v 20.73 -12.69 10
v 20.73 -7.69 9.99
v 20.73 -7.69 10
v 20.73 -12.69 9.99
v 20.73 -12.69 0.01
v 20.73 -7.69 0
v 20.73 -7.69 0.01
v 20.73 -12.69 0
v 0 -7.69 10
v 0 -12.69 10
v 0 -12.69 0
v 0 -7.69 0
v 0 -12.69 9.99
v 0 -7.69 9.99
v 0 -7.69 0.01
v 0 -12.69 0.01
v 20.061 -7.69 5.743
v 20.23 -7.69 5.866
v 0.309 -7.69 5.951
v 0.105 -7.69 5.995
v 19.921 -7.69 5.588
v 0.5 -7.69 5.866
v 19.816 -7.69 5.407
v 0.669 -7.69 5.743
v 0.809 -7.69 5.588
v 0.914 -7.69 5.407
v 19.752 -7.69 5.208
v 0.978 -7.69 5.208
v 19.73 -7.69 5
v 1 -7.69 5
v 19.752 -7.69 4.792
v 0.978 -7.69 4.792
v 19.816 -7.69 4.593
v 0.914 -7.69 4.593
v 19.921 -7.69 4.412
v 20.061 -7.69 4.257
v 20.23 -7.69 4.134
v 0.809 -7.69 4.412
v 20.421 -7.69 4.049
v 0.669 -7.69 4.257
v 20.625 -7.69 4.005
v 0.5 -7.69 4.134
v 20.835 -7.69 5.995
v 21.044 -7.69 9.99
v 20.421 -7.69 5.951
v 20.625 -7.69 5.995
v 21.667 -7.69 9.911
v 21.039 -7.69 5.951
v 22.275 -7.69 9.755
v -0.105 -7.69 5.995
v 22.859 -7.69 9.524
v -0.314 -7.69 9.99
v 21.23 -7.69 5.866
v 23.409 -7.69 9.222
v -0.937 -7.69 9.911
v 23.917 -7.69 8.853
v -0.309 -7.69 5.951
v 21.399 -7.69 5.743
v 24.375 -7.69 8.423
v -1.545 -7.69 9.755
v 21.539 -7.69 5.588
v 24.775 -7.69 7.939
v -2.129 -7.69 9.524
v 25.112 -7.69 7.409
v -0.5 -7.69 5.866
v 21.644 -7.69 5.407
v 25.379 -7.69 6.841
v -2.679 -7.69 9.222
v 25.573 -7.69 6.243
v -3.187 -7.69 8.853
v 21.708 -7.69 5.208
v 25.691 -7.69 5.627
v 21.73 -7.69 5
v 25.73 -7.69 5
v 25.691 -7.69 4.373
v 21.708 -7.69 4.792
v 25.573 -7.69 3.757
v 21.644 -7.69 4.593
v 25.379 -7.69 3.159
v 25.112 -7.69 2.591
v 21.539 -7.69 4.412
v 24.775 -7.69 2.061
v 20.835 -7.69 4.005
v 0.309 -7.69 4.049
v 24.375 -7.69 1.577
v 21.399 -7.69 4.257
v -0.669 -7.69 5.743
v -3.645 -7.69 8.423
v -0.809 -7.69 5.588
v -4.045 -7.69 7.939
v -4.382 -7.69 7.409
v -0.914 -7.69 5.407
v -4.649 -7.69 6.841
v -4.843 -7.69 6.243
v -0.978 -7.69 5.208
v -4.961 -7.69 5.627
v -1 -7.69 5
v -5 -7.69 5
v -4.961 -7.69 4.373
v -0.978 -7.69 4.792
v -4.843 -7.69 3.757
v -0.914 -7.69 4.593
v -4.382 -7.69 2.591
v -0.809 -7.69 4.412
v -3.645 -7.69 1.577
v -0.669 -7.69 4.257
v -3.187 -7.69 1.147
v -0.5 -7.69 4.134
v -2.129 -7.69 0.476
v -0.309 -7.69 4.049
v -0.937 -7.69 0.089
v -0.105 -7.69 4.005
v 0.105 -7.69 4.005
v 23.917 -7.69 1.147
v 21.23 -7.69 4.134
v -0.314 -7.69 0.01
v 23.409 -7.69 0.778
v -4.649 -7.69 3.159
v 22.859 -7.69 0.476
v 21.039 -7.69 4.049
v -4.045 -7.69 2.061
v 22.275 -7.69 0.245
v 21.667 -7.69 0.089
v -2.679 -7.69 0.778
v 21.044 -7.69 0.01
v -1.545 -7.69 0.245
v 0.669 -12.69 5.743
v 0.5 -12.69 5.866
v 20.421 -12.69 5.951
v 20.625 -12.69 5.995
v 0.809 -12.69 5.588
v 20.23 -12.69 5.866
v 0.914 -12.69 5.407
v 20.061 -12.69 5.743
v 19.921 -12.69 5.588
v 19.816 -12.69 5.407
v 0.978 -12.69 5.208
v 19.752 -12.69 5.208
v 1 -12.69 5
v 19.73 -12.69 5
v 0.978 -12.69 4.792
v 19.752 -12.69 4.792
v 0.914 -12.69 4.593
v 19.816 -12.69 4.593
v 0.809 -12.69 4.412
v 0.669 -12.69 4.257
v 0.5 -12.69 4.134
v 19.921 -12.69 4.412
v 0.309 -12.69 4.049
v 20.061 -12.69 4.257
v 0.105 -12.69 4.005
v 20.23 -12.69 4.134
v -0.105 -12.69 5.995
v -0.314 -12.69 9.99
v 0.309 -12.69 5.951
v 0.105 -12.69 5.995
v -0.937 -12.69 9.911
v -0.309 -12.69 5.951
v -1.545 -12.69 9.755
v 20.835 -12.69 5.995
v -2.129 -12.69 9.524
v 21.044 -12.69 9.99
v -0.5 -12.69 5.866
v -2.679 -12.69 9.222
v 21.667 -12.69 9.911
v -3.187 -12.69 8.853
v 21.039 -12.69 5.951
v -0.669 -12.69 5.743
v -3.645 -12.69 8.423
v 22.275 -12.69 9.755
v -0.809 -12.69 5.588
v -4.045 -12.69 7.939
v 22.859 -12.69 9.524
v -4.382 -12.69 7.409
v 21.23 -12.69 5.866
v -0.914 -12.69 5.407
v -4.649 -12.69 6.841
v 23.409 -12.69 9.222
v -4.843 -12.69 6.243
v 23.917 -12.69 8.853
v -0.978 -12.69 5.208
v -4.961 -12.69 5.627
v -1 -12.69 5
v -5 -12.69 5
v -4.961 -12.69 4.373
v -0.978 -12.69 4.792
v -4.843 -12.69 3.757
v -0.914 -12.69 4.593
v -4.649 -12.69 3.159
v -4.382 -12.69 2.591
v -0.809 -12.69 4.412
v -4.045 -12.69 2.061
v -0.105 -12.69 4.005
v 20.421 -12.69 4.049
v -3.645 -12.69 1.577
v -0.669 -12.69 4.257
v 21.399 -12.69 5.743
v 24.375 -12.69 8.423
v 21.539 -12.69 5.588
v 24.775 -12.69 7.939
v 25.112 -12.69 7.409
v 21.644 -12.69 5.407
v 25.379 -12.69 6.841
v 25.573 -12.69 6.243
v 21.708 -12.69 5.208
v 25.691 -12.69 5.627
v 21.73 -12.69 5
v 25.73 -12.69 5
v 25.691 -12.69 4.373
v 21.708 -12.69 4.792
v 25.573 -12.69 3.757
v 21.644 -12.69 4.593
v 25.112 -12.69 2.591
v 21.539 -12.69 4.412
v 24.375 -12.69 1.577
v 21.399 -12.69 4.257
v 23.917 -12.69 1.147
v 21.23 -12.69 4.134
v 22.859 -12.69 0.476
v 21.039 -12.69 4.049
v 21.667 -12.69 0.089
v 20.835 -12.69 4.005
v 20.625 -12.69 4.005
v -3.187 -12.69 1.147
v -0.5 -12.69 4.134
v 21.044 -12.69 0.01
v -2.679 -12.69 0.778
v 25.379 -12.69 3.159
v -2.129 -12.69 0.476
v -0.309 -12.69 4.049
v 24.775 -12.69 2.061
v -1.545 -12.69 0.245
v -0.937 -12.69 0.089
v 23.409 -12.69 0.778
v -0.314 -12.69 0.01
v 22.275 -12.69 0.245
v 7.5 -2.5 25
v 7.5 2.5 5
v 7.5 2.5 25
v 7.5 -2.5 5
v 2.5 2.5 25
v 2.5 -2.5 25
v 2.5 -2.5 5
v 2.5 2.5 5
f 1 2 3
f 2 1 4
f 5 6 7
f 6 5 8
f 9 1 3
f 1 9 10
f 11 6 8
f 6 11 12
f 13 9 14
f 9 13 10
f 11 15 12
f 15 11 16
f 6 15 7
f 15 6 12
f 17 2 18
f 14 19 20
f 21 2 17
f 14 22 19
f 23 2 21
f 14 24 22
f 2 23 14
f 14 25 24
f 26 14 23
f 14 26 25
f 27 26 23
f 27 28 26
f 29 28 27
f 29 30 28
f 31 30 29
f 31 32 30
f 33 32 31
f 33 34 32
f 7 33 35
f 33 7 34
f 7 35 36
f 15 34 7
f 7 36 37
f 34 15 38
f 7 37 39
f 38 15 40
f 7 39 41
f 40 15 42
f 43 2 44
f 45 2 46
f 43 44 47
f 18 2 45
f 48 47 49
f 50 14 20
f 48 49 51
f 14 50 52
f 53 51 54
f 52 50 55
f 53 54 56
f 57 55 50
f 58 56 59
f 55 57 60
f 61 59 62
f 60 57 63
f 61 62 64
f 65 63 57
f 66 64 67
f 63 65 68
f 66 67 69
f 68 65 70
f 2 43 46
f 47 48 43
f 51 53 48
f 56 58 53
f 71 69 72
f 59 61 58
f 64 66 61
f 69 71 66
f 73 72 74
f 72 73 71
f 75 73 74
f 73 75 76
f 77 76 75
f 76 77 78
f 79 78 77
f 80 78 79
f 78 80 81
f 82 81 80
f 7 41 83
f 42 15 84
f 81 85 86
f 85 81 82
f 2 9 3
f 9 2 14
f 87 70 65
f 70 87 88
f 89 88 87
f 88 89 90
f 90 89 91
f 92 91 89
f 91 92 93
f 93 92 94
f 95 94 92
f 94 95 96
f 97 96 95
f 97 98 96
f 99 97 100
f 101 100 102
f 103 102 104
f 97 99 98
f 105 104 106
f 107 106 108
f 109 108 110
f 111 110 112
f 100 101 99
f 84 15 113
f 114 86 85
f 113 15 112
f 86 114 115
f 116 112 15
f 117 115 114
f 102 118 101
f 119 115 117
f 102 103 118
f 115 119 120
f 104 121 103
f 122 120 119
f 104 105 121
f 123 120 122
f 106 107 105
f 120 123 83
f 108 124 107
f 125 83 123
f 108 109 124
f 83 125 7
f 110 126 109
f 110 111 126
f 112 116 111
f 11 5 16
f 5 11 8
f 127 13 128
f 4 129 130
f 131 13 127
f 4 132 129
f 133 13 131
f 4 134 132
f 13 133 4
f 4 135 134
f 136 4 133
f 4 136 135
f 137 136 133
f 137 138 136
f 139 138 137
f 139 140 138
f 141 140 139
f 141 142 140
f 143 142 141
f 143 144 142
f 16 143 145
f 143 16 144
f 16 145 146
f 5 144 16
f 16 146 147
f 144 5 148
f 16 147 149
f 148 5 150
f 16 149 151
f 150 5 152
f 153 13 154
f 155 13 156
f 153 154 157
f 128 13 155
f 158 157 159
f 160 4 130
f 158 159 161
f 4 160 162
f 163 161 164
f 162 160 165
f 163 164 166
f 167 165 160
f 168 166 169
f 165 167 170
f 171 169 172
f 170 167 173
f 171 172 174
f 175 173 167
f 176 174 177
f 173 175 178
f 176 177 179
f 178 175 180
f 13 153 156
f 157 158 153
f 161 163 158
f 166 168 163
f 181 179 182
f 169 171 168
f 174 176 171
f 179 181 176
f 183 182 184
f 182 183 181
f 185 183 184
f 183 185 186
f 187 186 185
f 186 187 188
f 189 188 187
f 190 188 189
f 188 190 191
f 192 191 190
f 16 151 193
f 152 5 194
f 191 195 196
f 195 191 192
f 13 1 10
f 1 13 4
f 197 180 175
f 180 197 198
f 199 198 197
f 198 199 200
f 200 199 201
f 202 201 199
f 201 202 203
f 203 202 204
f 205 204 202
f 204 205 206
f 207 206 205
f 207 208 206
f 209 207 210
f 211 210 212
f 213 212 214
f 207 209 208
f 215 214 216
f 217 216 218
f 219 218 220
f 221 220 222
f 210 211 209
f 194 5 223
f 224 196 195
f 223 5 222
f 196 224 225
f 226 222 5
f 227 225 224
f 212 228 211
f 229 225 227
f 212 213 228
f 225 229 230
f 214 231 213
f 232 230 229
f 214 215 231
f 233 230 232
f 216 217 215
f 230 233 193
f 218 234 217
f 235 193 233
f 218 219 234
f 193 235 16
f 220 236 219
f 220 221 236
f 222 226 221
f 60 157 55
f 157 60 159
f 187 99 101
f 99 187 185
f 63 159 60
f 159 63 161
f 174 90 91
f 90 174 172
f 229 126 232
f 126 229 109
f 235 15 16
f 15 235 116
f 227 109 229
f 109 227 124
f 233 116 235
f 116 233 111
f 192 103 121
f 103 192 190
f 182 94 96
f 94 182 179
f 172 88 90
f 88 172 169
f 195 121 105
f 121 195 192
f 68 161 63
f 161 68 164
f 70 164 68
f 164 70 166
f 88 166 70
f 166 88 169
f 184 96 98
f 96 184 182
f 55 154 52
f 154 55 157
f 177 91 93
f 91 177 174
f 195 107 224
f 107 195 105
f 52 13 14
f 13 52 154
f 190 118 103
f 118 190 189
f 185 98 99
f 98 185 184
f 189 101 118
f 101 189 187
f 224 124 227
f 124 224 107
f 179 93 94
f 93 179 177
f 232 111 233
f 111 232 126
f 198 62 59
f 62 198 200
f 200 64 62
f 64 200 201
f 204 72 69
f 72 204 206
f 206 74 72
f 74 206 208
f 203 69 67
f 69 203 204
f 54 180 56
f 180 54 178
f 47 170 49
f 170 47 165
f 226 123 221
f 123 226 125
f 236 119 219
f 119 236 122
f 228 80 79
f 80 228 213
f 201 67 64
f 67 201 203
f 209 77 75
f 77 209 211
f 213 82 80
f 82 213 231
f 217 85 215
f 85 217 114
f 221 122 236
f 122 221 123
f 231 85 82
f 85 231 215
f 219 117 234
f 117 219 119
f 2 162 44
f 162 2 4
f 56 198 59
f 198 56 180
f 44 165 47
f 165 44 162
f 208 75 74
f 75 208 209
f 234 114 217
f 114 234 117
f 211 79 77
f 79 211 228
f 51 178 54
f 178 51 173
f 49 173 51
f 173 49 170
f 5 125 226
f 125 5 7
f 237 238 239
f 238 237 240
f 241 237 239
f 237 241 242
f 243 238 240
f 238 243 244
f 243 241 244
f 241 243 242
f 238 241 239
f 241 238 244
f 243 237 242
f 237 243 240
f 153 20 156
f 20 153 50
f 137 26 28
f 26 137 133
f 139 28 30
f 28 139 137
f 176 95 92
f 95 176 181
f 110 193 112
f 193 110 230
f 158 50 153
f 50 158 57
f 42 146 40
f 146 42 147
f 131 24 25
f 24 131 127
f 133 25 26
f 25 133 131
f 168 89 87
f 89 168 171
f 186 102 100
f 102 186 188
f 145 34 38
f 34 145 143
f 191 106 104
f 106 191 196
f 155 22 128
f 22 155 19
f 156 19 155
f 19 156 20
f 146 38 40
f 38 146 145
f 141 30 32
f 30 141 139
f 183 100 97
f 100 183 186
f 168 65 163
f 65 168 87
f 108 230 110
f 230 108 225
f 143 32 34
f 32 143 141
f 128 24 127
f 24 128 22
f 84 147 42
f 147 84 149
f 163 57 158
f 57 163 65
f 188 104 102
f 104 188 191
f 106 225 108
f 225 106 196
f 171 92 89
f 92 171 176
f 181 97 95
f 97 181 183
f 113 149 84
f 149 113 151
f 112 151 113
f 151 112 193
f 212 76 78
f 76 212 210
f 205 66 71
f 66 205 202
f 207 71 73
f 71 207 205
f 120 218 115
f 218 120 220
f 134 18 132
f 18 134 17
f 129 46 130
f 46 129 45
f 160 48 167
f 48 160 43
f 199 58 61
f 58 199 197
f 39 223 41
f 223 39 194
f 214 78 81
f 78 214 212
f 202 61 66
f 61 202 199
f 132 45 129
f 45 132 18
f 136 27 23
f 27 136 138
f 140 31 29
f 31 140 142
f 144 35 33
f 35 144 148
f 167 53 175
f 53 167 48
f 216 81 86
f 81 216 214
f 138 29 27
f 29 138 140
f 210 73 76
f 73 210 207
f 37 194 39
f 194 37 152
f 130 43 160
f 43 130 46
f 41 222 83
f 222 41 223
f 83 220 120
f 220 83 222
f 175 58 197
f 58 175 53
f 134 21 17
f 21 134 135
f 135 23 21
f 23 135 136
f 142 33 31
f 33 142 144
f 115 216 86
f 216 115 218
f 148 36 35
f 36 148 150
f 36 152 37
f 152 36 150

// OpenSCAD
//arm to hold the idler wheel.  hinged in middle, wheel at one end and spring at the other.

//from the side on it is an L, from the top it is an Y

//planning to use an M2.5 bolt to hold the spring at either end

//tracks ahve a gap of 0.145 between plastic that rubs together
gap=0.15;
idlerHeight = 15.23;

gapWidth = idlerHeight + gap;

armThick=5;
armHeight=10;

//how much space between the axle of the idler and anything else
idlerRadiusAllowance = 8.73 + 2;
hingeRadiusAllowance = armHeight;


//distance between hingle axle and idler axle
armLength=armHeight + idlerRadiusAllowance;

springArmLength=20;

//same as idler?
axleRadius = 1;

springArmOffset = 5;


difference(){

	union(){
		//arm between hinge and idler wheel
		union(){
			translate([0,-armThick-gapWidth/2,0]) cube([armLength,armThick,armHeight]);

			translate([0,-gapWidth/2,armHeight/2]) rotate([90,0,0]) cylinder(r=armHeight/2, h= armThick, $fn = 50);
			
			translate([armLength,-gapWidth/2,armHeight/2]) rotate([90,0,0]) cylinder(r=armHeight/2, h= armThick, $fn = 50);
			}

	translate([-armThick/2 + springArmOffset,-armThick/2,armThick])cube([armThick,armThick,springArmLength]);
	
	}

	//hinge hole
	translate([0,20,armHeight/2]) rotate([90,0,0]) cylinder(r=axleRadius, h= 60, $fn = 30);
	
	//idler axle hole
	translate([armLength ,40 ,armHeight/2]) rotate([90,0,0]) cylinder(r=axleRadius, h= 80, $fn = 30);

}
